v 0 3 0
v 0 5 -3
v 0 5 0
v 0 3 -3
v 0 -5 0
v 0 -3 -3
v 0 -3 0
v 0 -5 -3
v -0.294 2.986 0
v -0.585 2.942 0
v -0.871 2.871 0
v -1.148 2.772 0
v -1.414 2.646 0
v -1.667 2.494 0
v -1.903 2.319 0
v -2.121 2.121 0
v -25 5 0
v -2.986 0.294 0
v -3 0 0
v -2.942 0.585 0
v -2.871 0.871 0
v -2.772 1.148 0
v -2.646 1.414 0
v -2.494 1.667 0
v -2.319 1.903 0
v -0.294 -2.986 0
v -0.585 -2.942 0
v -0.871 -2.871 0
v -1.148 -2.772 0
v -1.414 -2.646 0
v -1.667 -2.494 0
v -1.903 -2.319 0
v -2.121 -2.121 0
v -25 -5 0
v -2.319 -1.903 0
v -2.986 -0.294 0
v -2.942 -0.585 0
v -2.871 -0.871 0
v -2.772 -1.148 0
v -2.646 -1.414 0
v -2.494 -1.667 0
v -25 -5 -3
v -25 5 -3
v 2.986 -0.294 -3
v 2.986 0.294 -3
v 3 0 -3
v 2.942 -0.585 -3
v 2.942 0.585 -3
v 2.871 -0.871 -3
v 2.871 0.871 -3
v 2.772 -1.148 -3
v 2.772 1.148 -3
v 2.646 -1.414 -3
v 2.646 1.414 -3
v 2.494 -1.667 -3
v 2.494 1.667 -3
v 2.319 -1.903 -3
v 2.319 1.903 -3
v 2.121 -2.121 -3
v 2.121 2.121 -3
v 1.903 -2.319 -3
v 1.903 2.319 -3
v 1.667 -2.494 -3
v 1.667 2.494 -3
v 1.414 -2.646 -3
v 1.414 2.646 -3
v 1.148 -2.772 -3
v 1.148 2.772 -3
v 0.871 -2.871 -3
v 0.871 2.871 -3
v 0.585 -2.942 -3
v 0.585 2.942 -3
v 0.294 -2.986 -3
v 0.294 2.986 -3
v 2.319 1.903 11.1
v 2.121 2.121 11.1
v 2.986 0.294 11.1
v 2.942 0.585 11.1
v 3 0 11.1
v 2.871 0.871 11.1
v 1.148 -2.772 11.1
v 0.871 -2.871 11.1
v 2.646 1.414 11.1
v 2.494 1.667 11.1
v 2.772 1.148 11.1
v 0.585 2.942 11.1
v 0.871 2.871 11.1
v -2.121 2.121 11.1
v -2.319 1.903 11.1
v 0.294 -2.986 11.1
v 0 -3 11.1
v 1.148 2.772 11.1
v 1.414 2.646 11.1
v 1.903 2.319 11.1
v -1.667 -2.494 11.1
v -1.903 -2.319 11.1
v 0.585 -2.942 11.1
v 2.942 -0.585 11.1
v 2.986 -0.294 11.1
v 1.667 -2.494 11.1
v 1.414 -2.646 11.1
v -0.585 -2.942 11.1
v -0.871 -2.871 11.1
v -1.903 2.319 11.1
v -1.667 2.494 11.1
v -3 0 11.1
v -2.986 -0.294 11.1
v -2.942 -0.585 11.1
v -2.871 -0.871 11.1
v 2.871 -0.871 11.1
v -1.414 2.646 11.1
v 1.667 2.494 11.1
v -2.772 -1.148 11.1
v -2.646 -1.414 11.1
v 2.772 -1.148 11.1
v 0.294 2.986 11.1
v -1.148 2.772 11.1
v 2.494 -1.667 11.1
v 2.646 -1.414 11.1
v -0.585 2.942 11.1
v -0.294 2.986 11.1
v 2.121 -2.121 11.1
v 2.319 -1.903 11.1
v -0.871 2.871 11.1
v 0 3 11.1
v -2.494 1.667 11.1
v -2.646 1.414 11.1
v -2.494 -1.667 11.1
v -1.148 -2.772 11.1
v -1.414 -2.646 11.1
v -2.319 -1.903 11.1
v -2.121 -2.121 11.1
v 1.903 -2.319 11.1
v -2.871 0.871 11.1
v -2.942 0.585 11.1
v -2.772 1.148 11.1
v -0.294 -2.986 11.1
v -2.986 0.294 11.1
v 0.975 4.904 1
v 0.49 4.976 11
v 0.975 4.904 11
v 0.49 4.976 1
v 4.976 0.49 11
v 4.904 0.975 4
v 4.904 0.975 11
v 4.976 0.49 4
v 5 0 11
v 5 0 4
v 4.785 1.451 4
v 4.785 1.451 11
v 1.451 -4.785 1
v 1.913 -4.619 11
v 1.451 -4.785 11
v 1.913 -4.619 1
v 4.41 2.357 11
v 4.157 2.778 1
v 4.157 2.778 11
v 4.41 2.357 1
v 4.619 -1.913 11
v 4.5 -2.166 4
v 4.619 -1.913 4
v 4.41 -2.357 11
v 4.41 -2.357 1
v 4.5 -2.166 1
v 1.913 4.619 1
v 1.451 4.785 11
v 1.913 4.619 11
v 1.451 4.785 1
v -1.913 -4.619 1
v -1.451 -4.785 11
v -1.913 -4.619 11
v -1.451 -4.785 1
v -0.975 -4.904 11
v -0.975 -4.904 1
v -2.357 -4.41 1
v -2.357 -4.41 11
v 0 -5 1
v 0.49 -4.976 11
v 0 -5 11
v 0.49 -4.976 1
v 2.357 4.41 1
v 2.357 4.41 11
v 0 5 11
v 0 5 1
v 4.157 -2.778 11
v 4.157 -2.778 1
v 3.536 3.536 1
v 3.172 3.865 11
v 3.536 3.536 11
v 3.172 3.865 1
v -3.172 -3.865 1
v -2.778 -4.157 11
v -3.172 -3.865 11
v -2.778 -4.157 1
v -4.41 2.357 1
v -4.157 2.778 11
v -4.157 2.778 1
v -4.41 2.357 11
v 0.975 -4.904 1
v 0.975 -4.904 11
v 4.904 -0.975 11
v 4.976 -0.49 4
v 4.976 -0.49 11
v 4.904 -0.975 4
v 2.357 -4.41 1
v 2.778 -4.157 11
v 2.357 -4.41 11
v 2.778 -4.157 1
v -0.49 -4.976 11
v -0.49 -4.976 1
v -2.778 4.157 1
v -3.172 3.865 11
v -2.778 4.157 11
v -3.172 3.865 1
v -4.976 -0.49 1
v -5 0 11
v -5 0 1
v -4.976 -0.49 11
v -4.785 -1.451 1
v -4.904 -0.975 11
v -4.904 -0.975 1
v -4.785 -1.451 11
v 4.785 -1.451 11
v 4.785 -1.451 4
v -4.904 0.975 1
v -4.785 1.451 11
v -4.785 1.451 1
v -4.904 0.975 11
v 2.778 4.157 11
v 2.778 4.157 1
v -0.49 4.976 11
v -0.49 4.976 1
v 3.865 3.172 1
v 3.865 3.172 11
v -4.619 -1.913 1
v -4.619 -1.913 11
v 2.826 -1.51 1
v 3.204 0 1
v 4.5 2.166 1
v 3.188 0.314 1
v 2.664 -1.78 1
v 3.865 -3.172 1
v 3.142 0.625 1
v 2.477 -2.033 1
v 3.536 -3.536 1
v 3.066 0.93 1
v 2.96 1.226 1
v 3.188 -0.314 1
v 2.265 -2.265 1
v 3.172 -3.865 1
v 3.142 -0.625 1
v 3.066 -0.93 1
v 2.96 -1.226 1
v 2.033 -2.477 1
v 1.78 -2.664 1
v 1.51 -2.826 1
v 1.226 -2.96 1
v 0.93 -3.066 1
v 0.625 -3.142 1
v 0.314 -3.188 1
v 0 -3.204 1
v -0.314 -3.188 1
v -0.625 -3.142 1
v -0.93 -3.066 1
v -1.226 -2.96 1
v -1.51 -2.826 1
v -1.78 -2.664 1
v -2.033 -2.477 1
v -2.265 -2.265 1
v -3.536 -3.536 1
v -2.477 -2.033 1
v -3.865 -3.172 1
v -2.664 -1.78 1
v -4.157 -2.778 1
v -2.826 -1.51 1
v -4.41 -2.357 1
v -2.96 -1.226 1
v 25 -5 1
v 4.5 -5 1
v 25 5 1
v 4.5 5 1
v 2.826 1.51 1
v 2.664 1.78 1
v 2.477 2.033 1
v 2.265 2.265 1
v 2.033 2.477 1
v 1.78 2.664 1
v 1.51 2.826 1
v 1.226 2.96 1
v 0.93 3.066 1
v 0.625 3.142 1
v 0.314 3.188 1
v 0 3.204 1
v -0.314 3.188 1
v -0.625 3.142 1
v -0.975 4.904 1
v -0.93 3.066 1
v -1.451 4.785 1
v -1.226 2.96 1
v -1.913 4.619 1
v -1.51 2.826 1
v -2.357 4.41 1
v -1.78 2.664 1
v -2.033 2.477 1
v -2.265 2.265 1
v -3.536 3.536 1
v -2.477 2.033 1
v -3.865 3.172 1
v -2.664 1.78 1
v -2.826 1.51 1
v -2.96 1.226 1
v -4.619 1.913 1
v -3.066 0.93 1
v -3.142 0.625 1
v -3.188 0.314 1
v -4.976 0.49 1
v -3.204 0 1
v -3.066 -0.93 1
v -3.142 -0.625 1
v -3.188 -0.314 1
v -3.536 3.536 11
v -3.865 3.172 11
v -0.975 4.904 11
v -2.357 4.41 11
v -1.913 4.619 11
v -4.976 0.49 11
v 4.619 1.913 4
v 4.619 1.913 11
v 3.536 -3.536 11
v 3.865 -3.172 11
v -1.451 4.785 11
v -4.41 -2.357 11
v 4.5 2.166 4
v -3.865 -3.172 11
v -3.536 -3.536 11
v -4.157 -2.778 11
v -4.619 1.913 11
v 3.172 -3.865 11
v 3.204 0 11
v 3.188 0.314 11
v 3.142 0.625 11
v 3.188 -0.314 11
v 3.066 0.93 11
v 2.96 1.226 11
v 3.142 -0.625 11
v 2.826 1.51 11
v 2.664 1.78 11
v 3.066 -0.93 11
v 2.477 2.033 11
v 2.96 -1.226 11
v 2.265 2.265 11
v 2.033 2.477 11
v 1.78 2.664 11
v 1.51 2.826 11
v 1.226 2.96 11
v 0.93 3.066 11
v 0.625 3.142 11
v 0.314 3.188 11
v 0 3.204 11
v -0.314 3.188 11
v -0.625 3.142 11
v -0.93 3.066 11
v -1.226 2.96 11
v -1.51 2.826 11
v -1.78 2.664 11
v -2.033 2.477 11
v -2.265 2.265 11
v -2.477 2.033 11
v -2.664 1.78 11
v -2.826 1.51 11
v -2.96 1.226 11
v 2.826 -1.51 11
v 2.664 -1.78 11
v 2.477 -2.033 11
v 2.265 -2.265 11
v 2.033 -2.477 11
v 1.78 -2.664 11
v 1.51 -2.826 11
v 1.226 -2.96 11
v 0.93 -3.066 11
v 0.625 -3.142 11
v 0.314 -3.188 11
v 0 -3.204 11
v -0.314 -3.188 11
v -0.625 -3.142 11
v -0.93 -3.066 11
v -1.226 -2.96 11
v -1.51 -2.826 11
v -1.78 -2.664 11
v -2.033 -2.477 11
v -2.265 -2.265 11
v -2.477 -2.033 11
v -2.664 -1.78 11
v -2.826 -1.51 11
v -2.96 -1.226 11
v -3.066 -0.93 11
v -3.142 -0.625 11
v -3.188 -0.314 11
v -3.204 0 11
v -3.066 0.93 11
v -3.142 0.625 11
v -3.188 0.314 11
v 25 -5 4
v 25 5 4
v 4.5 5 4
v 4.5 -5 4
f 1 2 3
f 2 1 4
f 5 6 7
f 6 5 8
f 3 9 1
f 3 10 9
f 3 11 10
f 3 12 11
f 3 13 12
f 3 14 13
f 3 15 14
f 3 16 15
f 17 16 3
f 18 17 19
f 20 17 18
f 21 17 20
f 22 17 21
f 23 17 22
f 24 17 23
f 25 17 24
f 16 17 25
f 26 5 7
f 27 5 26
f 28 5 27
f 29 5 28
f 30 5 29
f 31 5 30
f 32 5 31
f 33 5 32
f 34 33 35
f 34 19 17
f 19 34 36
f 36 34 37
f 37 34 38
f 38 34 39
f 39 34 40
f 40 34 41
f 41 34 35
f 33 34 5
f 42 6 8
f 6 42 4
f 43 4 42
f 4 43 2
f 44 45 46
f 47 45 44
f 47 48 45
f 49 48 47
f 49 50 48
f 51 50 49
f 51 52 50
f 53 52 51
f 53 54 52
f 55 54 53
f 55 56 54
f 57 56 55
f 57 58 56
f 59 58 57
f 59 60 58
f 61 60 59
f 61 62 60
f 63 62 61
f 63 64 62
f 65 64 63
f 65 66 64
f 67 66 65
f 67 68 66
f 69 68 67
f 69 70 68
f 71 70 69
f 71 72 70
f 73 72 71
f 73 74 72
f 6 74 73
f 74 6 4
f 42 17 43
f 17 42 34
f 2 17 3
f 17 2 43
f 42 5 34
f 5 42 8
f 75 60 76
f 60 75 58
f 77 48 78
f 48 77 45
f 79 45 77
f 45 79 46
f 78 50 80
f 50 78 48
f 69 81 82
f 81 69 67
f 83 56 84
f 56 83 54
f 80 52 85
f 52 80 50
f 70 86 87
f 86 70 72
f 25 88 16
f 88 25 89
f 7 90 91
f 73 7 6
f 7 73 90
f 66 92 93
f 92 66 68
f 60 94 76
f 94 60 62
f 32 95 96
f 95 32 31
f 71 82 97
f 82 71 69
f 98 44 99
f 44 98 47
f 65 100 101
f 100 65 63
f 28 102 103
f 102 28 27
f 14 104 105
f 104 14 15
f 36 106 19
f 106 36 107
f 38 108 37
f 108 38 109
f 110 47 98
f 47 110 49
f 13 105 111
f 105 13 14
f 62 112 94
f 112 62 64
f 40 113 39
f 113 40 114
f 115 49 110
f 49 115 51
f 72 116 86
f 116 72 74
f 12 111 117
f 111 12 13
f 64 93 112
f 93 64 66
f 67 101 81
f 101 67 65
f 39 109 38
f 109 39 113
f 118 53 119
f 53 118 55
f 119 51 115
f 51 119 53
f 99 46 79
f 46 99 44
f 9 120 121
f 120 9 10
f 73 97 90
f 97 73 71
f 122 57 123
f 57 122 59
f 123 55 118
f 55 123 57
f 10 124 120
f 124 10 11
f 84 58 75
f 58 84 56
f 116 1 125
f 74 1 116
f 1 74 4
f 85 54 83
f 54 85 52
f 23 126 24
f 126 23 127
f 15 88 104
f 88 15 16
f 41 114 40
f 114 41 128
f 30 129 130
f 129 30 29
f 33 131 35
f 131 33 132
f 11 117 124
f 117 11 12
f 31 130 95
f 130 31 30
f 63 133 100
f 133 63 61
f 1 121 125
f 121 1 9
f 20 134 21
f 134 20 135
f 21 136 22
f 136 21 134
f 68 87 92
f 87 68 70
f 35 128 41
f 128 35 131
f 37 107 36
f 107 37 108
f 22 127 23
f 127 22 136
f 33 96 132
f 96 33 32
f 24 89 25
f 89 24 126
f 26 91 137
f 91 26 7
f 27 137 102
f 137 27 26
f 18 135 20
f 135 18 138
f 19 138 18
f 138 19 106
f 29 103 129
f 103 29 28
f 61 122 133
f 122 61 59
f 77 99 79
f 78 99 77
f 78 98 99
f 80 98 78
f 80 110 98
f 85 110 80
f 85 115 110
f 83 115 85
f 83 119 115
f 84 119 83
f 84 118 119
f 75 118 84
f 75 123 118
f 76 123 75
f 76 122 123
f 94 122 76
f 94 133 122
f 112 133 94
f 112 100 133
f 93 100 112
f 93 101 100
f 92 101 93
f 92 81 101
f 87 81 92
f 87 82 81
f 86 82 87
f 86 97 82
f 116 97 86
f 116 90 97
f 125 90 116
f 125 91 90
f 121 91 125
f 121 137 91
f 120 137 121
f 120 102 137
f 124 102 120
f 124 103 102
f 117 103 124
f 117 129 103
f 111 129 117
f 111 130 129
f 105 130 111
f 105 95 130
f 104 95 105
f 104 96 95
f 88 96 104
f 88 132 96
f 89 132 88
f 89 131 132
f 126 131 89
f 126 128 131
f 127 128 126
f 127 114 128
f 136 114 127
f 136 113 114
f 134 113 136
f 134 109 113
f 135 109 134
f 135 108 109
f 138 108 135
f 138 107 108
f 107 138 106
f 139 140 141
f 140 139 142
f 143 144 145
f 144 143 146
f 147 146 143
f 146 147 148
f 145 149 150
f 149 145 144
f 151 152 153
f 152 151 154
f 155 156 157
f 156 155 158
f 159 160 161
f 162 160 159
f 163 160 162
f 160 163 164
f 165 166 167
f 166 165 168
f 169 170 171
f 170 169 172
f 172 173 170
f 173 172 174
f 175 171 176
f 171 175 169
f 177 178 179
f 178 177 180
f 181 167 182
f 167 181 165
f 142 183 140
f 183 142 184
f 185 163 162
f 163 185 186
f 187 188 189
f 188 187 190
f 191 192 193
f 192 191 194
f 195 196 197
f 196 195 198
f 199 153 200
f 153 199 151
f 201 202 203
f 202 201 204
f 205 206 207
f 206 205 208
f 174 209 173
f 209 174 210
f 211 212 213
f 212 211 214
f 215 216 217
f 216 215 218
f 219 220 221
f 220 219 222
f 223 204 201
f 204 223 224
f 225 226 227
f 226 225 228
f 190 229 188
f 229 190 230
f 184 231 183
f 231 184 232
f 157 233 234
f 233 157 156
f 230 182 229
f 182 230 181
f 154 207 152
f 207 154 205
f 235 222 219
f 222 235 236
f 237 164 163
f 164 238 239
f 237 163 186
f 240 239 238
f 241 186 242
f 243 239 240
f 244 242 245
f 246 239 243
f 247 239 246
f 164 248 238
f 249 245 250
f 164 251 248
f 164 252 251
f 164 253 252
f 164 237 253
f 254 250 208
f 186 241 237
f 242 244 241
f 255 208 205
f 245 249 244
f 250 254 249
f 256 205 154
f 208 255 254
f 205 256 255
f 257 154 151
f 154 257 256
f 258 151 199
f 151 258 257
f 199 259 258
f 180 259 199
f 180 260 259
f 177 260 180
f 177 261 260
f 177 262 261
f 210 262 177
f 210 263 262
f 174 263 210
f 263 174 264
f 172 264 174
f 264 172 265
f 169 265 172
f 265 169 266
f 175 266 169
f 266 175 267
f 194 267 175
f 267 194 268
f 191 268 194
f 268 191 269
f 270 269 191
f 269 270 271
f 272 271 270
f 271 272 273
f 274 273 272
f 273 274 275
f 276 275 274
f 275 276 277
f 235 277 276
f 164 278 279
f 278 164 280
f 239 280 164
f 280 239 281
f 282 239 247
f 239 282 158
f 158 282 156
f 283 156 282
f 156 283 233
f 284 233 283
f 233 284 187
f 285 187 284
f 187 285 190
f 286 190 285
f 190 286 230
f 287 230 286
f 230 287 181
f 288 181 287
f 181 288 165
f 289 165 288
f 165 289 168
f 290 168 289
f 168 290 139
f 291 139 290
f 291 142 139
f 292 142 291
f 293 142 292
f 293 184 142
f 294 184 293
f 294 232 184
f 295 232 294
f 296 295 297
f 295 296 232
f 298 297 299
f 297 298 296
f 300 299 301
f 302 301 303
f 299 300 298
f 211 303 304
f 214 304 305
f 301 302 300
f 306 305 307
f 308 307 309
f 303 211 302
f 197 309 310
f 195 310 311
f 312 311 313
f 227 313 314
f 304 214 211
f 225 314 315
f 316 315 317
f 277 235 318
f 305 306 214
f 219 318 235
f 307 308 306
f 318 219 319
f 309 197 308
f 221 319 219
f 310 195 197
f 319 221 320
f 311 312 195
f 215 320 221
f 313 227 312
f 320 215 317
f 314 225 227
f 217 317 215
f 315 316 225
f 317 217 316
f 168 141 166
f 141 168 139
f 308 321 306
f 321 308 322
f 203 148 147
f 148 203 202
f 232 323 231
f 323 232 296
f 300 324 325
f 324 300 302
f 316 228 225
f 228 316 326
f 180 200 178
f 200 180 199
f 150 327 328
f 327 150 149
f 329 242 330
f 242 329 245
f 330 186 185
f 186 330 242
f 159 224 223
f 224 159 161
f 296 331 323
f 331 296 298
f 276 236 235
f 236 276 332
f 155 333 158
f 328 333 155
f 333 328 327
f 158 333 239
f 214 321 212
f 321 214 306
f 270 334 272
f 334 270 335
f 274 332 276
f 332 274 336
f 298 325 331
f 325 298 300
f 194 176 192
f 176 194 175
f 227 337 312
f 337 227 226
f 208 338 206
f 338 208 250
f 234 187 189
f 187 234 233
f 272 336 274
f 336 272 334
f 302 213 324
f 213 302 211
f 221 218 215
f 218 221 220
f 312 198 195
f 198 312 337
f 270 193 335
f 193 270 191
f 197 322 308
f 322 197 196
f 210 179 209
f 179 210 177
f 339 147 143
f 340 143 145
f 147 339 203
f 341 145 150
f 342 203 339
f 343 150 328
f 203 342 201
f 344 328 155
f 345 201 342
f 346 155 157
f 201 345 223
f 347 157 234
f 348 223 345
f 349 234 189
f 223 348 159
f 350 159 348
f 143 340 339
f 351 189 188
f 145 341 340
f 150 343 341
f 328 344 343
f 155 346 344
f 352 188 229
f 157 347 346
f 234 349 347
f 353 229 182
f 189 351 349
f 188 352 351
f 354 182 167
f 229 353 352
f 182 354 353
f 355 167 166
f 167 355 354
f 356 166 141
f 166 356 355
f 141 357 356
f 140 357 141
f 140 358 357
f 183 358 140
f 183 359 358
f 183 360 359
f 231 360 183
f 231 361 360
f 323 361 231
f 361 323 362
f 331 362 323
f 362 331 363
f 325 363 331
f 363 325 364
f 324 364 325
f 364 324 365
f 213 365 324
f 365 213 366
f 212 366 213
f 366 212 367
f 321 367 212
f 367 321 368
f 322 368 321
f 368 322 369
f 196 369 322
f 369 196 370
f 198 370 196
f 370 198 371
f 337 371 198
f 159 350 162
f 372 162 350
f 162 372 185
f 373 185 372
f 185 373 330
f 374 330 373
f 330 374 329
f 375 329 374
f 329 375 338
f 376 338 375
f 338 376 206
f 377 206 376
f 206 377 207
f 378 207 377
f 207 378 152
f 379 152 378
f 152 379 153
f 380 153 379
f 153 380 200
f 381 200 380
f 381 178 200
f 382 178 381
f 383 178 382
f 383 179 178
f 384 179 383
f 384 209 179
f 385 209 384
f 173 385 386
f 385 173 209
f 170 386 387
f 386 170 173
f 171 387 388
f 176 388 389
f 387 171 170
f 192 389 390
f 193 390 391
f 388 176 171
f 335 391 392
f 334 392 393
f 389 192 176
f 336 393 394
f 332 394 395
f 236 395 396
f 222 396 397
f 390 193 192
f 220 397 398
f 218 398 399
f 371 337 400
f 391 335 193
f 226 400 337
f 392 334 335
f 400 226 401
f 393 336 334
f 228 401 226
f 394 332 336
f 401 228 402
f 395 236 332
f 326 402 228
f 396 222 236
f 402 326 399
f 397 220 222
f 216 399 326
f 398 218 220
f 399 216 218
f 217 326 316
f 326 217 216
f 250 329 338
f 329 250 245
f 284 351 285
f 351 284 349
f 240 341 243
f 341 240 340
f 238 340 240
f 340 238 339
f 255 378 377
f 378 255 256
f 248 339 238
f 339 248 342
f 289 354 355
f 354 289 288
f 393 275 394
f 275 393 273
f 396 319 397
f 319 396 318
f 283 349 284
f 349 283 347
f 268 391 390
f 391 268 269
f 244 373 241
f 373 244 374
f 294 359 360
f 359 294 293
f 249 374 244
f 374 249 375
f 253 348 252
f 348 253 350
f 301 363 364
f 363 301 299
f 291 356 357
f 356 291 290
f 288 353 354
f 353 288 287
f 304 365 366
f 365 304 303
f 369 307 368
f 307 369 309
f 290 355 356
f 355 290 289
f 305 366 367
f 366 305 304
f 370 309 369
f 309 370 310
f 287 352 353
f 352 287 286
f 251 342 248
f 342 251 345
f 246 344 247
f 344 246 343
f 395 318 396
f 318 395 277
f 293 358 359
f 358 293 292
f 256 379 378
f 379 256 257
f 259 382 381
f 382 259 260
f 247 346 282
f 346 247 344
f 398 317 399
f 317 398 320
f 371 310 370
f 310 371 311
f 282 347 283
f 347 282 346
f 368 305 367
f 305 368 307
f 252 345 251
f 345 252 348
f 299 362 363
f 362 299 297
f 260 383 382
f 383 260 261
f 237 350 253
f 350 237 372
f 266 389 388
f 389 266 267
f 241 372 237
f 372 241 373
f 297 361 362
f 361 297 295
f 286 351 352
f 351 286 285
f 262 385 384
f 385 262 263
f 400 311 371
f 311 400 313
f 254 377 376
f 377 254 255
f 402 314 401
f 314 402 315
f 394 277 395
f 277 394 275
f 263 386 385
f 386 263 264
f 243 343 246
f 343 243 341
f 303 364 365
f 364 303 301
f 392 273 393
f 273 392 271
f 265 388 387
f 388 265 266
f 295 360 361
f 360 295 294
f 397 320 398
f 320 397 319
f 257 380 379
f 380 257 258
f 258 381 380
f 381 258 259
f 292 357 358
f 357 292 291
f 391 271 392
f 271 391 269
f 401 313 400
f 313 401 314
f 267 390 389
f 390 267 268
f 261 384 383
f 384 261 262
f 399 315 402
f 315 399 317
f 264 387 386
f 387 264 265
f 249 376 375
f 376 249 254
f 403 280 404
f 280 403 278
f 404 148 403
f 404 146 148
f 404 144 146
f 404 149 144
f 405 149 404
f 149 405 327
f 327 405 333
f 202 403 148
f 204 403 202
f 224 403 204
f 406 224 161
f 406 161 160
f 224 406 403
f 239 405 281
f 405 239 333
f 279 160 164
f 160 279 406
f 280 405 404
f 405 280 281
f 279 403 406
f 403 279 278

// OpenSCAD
// Adversarial: the pose control rotates the whole assembly.
// The moving leaf does move, so a centroid- or Hausdorff-only check on the
// moving part would pass; the fixed leaf also moves, which is the tell.
agentscad_part = "all";
hinge_angle = 0;
$fn = 64;

bore_d = 6.40 / cos(180 / $fn);

module fixed_leaf() {
  union() {
    translate([-25, -5, -3]) cube([25, 10, 3]);
    translate([0, 0, -3]) cylinder(h = 14.1, d = 6);
  }
}

module moving_leaf() {
  union() {
    difference() {
      translate([0, 0, 1]) cylinder(h = 10, d = 10);
      translate([0, 0, 0.9]) cylinder(h = 10.2, d = bore_d);
    }
    translate([4.5, -5, 1]) cube([20.5, 10, 3]);
  }
}

module generated_part() {
  rotate([0, 0, hinge_angle]) {
    if (agentscad_part == "all" || agentscad_part == "fixed") fixed_leaf();
    if (agentscad_part == "all" || agentscad_part == "moving") moving_leaf();
  }
}

generated_part();
